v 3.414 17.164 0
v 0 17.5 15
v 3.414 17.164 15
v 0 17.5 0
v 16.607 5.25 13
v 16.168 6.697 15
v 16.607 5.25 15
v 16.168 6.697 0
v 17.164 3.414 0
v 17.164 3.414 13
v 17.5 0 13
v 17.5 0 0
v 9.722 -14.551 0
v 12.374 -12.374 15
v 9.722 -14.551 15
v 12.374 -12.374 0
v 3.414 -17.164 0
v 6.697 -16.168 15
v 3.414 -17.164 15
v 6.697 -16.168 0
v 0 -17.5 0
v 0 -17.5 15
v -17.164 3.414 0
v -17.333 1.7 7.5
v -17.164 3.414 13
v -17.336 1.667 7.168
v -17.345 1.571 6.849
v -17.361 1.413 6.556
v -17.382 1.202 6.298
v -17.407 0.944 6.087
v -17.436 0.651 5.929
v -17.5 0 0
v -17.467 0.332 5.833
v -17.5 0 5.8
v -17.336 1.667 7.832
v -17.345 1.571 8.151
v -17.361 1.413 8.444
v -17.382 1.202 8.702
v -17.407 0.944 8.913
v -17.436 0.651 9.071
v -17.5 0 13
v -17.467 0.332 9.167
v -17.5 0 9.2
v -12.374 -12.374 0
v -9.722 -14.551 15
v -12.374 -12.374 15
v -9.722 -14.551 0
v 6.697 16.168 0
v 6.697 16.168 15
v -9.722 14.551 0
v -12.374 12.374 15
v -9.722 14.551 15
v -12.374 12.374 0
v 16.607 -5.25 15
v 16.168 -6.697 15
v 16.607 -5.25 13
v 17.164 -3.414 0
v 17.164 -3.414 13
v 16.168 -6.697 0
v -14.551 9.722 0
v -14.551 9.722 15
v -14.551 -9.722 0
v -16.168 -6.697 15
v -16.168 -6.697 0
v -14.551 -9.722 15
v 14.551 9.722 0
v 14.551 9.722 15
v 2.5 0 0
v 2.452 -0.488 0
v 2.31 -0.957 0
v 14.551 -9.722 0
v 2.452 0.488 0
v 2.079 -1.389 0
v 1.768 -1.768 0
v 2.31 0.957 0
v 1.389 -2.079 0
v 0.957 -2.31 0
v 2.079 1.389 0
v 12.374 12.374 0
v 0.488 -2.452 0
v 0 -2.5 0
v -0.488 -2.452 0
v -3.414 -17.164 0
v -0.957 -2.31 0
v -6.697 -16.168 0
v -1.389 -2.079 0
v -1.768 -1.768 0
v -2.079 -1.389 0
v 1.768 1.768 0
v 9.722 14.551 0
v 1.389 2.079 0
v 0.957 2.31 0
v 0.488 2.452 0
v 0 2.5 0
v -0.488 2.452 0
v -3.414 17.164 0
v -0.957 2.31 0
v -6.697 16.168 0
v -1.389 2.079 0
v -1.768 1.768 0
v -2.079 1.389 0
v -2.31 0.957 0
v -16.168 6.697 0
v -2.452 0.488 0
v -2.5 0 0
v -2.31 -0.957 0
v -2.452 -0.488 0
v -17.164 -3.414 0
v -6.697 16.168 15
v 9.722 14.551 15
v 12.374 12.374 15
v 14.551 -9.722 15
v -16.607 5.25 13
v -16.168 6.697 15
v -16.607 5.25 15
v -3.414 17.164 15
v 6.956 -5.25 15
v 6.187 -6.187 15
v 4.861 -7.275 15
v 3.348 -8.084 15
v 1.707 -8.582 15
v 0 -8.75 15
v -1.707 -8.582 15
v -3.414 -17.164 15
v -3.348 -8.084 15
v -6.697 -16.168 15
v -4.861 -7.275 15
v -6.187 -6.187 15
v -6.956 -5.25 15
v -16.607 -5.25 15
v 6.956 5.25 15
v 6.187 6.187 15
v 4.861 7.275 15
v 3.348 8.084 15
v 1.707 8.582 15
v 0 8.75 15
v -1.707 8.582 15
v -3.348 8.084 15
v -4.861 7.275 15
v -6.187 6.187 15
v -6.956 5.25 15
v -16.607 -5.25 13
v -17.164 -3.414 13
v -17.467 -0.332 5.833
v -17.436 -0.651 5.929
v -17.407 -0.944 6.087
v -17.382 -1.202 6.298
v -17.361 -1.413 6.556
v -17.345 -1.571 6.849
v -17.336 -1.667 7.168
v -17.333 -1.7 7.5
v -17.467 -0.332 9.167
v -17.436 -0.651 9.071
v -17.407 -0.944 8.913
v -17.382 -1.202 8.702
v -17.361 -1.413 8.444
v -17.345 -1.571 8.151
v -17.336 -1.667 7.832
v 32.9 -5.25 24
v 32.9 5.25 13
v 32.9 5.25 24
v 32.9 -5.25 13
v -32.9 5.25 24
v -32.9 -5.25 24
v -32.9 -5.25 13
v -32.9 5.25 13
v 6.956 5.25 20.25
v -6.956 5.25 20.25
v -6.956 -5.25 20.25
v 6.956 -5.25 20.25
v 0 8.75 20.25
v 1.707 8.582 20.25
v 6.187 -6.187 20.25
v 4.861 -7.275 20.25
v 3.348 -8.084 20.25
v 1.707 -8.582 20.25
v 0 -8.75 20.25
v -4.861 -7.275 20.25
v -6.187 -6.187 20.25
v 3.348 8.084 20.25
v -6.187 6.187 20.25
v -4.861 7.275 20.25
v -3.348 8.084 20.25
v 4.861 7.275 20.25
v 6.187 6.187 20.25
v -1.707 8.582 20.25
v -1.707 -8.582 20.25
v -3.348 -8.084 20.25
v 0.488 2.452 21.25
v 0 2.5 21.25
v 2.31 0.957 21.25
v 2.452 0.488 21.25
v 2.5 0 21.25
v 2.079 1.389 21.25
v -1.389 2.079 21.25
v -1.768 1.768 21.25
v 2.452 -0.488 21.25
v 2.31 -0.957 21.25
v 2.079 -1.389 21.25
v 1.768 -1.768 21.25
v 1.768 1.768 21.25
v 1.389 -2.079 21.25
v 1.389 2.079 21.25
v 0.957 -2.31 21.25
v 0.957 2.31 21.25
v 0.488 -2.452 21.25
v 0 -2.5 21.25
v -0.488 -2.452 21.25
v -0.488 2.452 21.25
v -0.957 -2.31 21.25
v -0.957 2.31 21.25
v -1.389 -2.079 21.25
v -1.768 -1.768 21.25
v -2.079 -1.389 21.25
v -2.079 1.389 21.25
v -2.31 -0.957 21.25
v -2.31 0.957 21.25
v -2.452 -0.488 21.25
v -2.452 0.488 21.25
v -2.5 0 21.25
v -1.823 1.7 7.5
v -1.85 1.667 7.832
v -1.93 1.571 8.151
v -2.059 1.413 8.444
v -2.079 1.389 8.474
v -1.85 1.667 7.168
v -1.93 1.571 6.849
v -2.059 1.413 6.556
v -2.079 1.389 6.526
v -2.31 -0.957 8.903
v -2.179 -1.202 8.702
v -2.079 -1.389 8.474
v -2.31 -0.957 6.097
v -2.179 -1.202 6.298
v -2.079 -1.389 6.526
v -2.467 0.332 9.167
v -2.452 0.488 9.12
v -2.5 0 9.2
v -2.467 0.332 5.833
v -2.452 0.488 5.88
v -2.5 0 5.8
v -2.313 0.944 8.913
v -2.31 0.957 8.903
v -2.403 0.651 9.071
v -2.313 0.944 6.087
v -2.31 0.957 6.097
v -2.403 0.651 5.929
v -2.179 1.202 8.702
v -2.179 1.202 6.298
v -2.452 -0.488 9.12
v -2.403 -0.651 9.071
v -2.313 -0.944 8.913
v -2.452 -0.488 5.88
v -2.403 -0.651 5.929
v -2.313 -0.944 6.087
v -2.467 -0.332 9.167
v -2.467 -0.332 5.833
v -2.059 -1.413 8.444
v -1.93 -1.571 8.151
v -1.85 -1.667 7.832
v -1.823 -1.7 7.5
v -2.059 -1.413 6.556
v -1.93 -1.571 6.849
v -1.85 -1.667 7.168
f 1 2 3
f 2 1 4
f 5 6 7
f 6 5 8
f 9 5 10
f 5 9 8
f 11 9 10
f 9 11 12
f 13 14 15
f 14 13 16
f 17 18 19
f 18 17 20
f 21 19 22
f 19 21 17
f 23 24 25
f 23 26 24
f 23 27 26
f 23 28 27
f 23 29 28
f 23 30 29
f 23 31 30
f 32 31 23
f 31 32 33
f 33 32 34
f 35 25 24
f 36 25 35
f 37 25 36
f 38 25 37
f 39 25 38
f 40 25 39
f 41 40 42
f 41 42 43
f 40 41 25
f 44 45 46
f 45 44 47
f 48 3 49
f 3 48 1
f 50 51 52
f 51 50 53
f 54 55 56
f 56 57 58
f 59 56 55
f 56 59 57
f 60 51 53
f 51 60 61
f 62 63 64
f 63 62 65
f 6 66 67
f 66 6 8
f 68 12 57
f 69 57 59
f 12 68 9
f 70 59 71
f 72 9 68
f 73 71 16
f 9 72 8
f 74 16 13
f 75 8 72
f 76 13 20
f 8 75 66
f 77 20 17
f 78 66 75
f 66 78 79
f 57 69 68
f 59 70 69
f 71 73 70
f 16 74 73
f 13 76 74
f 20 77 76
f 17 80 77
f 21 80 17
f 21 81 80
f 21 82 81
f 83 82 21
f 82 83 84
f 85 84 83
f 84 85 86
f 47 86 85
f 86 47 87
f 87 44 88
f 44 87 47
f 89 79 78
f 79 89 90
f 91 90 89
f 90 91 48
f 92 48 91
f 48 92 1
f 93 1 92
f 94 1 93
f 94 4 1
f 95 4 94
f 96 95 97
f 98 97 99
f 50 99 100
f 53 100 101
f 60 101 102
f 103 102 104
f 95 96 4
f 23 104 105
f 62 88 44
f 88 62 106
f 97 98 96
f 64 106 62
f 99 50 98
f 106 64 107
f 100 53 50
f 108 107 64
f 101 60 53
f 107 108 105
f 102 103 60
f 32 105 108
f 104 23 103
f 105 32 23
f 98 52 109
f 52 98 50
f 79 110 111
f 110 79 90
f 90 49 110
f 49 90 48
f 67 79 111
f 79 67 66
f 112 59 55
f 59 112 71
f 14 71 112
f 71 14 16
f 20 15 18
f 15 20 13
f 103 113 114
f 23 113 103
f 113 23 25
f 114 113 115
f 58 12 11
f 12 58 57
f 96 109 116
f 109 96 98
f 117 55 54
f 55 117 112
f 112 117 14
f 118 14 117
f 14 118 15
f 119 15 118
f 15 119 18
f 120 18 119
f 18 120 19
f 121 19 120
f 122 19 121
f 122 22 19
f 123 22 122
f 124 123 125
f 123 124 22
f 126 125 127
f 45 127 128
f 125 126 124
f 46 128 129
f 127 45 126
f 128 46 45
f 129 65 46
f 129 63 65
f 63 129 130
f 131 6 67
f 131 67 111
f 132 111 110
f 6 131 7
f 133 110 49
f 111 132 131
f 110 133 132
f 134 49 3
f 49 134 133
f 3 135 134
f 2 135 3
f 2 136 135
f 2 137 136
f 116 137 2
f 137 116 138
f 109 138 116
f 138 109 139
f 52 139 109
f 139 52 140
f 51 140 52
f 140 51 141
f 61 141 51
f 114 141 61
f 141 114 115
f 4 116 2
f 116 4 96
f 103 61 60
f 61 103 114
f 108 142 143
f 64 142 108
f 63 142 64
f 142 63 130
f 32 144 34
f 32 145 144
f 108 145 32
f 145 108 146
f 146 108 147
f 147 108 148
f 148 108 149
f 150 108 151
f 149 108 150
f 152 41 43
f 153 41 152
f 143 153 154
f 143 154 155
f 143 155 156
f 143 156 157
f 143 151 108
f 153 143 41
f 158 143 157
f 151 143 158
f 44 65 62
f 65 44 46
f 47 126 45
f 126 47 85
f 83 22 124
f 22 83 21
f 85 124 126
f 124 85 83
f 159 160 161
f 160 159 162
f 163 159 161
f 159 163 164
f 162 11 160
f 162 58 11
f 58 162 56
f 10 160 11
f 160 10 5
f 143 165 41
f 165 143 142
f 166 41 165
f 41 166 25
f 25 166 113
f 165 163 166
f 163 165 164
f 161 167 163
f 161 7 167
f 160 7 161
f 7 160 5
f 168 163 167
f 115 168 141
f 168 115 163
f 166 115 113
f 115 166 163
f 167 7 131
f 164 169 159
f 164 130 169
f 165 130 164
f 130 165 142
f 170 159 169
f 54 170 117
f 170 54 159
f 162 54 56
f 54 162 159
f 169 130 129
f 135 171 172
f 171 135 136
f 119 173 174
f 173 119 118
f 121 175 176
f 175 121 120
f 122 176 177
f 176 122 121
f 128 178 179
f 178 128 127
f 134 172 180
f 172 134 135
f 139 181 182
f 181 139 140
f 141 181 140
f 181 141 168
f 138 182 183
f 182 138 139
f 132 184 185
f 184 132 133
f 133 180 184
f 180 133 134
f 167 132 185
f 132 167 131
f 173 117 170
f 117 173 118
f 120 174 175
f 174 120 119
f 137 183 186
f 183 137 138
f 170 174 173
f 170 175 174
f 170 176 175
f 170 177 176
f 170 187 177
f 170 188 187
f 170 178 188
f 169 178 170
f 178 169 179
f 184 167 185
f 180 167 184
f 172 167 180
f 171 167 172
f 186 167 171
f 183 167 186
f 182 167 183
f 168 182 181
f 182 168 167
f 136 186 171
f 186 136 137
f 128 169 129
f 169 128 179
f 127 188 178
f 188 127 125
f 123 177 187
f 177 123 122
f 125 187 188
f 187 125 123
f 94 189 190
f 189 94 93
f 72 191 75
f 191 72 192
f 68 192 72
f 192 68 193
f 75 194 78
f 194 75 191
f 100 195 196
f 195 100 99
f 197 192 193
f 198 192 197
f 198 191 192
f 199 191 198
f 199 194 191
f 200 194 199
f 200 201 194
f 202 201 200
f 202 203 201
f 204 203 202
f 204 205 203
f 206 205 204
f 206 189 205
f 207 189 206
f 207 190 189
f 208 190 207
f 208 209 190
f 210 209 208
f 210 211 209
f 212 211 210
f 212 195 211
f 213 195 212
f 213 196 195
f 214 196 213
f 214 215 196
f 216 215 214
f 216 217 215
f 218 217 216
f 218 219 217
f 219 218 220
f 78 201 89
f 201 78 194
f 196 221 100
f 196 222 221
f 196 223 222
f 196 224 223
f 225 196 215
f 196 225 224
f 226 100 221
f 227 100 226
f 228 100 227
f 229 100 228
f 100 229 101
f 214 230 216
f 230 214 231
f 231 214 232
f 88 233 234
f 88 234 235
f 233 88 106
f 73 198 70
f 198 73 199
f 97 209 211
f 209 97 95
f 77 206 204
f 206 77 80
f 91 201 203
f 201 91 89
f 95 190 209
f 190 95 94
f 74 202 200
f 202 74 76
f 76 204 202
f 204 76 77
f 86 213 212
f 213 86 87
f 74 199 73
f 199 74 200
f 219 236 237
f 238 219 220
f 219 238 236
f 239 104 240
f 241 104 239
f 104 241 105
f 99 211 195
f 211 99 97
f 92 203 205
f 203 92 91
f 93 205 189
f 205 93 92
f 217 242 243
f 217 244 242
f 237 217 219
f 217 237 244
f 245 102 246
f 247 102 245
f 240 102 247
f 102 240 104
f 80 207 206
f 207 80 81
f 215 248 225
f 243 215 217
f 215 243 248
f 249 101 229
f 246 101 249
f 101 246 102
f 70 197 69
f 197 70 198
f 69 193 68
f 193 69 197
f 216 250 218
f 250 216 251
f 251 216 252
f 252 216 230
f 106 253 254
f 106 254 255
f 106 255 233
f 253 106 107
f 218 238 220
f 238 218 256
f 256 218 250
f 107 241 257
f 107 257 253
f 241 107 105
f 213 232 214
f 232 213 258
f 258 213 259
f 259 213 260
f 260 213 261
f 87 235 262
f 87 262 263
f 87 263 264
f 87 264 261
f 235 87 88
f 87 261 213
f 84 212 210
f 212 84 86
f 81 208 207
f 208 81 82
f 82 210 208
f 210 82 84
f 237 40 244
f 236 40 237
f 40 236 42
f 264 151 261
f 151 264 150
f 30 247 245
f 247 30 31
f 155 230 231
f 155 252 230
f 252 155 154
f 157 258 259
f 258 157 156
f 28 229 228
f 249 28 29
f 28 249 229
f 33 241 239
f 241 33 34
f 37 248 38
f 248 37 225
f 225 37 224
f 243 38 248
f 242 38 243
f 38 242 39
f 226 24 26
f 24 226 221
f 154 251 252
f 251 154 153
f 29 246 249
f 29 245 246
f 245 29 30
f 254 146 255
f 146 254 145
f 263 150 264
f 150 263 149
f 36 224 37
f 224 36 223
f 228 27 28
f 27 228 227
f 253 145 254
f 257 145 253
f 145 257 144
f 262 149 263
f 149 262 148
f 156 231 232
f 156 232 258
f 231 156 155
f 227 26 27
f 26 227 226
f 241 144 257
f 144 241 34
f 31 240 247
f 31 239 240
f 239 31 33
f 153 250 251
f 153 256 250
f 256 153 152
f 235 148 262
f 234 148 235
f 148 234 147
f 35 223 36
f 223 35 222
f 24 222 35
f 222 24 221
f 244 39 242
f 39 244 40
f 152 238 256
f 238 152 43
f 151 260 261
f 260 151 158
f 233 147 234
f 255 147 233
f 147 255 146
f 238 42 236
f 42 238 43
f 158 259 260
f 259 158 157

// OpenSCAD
$fn = 32;

// ----------------------------------------------------------------------
// Hand knob: 35 x 65.8 x 20.25 mm
// ----------------------------------------------------------------------

// --- parameters (mm) ---
head_d = 35;              // knob diameter
head_h = 15;              // knob height
hole_d = 5;               // shaft bore
set_d = 3.4;              // set screw tap hole
wing_l = 65.8;            // wing span
wing_w = 10.5;            // wing width
wing_h = 9;               // wing thickness
cap_h = 5.25;             // raised centre cap
cap_d = 17.5;             // centre cap diameter

module body() {
  cylinder(h = head_h, d = head_d);
}

module wing() {
  /* wing sunk 2 mm into the knob so the joint overlaps */
  translate([-wing_l / 2, -wing_w / 2, head_h - 2])
    cube([wing_l, wing_w, wing_h + 2]);
}

module cap() {
  translate([0, 0, head_h - 1]) cylinder(h = cap_h + 1, d = cap_d);
}

difference() {
  union() {
    body();
    wing();
    cap();
  }
  translate([0, 0, -1]) cylinder(h = head_h + cap_h + 2, d = hole_d);
  translate([-head_d / 2 - 1, 0, head_h * 0.5]) rotate([0, 90, 0]) cylinder(h = head_d / 2 + 2, d = set_d);
}
